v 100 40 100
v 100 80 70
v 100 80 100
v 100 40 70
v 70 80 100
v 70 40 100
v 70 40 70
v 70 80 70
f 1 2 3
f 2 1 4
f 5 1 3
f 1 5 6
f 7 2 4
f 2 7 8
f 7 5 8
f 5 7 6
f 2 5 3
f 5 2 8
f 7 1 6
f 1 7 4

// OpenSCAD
// file: constants.scad
garageX = 100;
garageY = 40;
mainX = 100;
mainY = 80;

outWallThick = 3.7;
inWallThick = 2.2;
// file: roof.scad
include <constants.scad>
module garageRoof(thick,start,out,height) {
	polyhedron
		(points = [
			//low points
			[start[0]-out,start[1]-out,start[2]],
			[start[0]+garageX+out,start[1]-out,start[2]],
			[start[0]+garageX+out,start[1]+garageY+out,start[2]],
			[start[0]-out,start[1]+garageY+out,start[2]],
			[start[0]+garageX/2,start[1]-out,start[2]+height],
			[start[0]+garageX/2,start[1]+garageY+out,start[2]+height],
			//high points
			[start[0]-out,start[1]-out,start[2]+thick],
			[start[0]+garageX+out,start[1]-out,start[2]+thick],
			[start[0]+garageX+out,start[1]+garageY+out,start[2]+thick],
			[start[0]-out,start[1]+garageY+out,start[2]+thick],
			[start[0]+garageX/2,start[1]-out,start[2]+height+thick],
			[start[0]+garageX/2,start[1]+garageY+out,start[2]+height+thick],
		],
		faces = [
			//low faces
			[1,5,4],[1,2,5],[0,3,4],[3,4,5],
			//high faces
			[7,11,10],[7,8,11],[6,9,10],[9,10,11],
			//front faces
			[0,6,10],[0,4,10],[1,7,10],[1,4,10],
			[1,7,8],[1,2,8],
			[3,9,11],[3,5,11],[2,8,11],[2,5,11],
			[0,6,3],[6,3,9]
		]
	);
	
}

module highRoof(thick,start,out,height) {
	polyhedron
		(points = [
			//low points
			[start[0]+mainX+out,start[1]-out,start[2]],
			[start[0]+mainX+out,start[1]+mainY+out,start[2]],
			[start[0]-out,start[1]+mainY+out,start[2]],
			[start[0]-out,start[1]-out,start[2]],
			[start[0]-out,start[1]+mainY/2,start[2]+height],
			[start[0]+mainX+out,start[1]+mainY/2,start[2]+height],
			//high points
			[start[0]+mainX+out,start[1]-out,start[2]+thick],
			[start[0]+mainX+out,start[1]+mainY+out,start[2]+thick],
			[start[0]-out,start[1]+mainY+out,start[2]+thick],
			[start[0]-out,start[1]-out,start[2]+thick],
			[start[0]-out,start[1]+mainY/2,start[2]+height+thick],
			[start[0]+mainX+out,start[1]+mainY/2,start[2]+height+thick]
		],
		faces = [
			//low faces
			[0,5,3],[3,4,5],[5,4,1],[1,2,4],
			//high faces
			[6,11,9],[9,10,11],[11,10,7],[7,8,10],
			//front faces
			[0,6,5],[6,5,11],[5,11,1],[1,7,11],
			[1,7,8],[1,2,8],
			[3,9,10],[3,4,10],[2,8,10],[2,4,10],
			[0,6,3],[6,3,9]
		]
	);
}

garageRoof(2,[-50,-60,0],5,25);
highRoof(2,[-50,-20,15],5,25);
// main file
use <roof.scad> 
module thirdFloor() {
	difference() {
		translate([70,40,70]) cube([30,40,30]);
		highRoof(20,[0,40,85],5,35);
	}
}

thirdFloor();
